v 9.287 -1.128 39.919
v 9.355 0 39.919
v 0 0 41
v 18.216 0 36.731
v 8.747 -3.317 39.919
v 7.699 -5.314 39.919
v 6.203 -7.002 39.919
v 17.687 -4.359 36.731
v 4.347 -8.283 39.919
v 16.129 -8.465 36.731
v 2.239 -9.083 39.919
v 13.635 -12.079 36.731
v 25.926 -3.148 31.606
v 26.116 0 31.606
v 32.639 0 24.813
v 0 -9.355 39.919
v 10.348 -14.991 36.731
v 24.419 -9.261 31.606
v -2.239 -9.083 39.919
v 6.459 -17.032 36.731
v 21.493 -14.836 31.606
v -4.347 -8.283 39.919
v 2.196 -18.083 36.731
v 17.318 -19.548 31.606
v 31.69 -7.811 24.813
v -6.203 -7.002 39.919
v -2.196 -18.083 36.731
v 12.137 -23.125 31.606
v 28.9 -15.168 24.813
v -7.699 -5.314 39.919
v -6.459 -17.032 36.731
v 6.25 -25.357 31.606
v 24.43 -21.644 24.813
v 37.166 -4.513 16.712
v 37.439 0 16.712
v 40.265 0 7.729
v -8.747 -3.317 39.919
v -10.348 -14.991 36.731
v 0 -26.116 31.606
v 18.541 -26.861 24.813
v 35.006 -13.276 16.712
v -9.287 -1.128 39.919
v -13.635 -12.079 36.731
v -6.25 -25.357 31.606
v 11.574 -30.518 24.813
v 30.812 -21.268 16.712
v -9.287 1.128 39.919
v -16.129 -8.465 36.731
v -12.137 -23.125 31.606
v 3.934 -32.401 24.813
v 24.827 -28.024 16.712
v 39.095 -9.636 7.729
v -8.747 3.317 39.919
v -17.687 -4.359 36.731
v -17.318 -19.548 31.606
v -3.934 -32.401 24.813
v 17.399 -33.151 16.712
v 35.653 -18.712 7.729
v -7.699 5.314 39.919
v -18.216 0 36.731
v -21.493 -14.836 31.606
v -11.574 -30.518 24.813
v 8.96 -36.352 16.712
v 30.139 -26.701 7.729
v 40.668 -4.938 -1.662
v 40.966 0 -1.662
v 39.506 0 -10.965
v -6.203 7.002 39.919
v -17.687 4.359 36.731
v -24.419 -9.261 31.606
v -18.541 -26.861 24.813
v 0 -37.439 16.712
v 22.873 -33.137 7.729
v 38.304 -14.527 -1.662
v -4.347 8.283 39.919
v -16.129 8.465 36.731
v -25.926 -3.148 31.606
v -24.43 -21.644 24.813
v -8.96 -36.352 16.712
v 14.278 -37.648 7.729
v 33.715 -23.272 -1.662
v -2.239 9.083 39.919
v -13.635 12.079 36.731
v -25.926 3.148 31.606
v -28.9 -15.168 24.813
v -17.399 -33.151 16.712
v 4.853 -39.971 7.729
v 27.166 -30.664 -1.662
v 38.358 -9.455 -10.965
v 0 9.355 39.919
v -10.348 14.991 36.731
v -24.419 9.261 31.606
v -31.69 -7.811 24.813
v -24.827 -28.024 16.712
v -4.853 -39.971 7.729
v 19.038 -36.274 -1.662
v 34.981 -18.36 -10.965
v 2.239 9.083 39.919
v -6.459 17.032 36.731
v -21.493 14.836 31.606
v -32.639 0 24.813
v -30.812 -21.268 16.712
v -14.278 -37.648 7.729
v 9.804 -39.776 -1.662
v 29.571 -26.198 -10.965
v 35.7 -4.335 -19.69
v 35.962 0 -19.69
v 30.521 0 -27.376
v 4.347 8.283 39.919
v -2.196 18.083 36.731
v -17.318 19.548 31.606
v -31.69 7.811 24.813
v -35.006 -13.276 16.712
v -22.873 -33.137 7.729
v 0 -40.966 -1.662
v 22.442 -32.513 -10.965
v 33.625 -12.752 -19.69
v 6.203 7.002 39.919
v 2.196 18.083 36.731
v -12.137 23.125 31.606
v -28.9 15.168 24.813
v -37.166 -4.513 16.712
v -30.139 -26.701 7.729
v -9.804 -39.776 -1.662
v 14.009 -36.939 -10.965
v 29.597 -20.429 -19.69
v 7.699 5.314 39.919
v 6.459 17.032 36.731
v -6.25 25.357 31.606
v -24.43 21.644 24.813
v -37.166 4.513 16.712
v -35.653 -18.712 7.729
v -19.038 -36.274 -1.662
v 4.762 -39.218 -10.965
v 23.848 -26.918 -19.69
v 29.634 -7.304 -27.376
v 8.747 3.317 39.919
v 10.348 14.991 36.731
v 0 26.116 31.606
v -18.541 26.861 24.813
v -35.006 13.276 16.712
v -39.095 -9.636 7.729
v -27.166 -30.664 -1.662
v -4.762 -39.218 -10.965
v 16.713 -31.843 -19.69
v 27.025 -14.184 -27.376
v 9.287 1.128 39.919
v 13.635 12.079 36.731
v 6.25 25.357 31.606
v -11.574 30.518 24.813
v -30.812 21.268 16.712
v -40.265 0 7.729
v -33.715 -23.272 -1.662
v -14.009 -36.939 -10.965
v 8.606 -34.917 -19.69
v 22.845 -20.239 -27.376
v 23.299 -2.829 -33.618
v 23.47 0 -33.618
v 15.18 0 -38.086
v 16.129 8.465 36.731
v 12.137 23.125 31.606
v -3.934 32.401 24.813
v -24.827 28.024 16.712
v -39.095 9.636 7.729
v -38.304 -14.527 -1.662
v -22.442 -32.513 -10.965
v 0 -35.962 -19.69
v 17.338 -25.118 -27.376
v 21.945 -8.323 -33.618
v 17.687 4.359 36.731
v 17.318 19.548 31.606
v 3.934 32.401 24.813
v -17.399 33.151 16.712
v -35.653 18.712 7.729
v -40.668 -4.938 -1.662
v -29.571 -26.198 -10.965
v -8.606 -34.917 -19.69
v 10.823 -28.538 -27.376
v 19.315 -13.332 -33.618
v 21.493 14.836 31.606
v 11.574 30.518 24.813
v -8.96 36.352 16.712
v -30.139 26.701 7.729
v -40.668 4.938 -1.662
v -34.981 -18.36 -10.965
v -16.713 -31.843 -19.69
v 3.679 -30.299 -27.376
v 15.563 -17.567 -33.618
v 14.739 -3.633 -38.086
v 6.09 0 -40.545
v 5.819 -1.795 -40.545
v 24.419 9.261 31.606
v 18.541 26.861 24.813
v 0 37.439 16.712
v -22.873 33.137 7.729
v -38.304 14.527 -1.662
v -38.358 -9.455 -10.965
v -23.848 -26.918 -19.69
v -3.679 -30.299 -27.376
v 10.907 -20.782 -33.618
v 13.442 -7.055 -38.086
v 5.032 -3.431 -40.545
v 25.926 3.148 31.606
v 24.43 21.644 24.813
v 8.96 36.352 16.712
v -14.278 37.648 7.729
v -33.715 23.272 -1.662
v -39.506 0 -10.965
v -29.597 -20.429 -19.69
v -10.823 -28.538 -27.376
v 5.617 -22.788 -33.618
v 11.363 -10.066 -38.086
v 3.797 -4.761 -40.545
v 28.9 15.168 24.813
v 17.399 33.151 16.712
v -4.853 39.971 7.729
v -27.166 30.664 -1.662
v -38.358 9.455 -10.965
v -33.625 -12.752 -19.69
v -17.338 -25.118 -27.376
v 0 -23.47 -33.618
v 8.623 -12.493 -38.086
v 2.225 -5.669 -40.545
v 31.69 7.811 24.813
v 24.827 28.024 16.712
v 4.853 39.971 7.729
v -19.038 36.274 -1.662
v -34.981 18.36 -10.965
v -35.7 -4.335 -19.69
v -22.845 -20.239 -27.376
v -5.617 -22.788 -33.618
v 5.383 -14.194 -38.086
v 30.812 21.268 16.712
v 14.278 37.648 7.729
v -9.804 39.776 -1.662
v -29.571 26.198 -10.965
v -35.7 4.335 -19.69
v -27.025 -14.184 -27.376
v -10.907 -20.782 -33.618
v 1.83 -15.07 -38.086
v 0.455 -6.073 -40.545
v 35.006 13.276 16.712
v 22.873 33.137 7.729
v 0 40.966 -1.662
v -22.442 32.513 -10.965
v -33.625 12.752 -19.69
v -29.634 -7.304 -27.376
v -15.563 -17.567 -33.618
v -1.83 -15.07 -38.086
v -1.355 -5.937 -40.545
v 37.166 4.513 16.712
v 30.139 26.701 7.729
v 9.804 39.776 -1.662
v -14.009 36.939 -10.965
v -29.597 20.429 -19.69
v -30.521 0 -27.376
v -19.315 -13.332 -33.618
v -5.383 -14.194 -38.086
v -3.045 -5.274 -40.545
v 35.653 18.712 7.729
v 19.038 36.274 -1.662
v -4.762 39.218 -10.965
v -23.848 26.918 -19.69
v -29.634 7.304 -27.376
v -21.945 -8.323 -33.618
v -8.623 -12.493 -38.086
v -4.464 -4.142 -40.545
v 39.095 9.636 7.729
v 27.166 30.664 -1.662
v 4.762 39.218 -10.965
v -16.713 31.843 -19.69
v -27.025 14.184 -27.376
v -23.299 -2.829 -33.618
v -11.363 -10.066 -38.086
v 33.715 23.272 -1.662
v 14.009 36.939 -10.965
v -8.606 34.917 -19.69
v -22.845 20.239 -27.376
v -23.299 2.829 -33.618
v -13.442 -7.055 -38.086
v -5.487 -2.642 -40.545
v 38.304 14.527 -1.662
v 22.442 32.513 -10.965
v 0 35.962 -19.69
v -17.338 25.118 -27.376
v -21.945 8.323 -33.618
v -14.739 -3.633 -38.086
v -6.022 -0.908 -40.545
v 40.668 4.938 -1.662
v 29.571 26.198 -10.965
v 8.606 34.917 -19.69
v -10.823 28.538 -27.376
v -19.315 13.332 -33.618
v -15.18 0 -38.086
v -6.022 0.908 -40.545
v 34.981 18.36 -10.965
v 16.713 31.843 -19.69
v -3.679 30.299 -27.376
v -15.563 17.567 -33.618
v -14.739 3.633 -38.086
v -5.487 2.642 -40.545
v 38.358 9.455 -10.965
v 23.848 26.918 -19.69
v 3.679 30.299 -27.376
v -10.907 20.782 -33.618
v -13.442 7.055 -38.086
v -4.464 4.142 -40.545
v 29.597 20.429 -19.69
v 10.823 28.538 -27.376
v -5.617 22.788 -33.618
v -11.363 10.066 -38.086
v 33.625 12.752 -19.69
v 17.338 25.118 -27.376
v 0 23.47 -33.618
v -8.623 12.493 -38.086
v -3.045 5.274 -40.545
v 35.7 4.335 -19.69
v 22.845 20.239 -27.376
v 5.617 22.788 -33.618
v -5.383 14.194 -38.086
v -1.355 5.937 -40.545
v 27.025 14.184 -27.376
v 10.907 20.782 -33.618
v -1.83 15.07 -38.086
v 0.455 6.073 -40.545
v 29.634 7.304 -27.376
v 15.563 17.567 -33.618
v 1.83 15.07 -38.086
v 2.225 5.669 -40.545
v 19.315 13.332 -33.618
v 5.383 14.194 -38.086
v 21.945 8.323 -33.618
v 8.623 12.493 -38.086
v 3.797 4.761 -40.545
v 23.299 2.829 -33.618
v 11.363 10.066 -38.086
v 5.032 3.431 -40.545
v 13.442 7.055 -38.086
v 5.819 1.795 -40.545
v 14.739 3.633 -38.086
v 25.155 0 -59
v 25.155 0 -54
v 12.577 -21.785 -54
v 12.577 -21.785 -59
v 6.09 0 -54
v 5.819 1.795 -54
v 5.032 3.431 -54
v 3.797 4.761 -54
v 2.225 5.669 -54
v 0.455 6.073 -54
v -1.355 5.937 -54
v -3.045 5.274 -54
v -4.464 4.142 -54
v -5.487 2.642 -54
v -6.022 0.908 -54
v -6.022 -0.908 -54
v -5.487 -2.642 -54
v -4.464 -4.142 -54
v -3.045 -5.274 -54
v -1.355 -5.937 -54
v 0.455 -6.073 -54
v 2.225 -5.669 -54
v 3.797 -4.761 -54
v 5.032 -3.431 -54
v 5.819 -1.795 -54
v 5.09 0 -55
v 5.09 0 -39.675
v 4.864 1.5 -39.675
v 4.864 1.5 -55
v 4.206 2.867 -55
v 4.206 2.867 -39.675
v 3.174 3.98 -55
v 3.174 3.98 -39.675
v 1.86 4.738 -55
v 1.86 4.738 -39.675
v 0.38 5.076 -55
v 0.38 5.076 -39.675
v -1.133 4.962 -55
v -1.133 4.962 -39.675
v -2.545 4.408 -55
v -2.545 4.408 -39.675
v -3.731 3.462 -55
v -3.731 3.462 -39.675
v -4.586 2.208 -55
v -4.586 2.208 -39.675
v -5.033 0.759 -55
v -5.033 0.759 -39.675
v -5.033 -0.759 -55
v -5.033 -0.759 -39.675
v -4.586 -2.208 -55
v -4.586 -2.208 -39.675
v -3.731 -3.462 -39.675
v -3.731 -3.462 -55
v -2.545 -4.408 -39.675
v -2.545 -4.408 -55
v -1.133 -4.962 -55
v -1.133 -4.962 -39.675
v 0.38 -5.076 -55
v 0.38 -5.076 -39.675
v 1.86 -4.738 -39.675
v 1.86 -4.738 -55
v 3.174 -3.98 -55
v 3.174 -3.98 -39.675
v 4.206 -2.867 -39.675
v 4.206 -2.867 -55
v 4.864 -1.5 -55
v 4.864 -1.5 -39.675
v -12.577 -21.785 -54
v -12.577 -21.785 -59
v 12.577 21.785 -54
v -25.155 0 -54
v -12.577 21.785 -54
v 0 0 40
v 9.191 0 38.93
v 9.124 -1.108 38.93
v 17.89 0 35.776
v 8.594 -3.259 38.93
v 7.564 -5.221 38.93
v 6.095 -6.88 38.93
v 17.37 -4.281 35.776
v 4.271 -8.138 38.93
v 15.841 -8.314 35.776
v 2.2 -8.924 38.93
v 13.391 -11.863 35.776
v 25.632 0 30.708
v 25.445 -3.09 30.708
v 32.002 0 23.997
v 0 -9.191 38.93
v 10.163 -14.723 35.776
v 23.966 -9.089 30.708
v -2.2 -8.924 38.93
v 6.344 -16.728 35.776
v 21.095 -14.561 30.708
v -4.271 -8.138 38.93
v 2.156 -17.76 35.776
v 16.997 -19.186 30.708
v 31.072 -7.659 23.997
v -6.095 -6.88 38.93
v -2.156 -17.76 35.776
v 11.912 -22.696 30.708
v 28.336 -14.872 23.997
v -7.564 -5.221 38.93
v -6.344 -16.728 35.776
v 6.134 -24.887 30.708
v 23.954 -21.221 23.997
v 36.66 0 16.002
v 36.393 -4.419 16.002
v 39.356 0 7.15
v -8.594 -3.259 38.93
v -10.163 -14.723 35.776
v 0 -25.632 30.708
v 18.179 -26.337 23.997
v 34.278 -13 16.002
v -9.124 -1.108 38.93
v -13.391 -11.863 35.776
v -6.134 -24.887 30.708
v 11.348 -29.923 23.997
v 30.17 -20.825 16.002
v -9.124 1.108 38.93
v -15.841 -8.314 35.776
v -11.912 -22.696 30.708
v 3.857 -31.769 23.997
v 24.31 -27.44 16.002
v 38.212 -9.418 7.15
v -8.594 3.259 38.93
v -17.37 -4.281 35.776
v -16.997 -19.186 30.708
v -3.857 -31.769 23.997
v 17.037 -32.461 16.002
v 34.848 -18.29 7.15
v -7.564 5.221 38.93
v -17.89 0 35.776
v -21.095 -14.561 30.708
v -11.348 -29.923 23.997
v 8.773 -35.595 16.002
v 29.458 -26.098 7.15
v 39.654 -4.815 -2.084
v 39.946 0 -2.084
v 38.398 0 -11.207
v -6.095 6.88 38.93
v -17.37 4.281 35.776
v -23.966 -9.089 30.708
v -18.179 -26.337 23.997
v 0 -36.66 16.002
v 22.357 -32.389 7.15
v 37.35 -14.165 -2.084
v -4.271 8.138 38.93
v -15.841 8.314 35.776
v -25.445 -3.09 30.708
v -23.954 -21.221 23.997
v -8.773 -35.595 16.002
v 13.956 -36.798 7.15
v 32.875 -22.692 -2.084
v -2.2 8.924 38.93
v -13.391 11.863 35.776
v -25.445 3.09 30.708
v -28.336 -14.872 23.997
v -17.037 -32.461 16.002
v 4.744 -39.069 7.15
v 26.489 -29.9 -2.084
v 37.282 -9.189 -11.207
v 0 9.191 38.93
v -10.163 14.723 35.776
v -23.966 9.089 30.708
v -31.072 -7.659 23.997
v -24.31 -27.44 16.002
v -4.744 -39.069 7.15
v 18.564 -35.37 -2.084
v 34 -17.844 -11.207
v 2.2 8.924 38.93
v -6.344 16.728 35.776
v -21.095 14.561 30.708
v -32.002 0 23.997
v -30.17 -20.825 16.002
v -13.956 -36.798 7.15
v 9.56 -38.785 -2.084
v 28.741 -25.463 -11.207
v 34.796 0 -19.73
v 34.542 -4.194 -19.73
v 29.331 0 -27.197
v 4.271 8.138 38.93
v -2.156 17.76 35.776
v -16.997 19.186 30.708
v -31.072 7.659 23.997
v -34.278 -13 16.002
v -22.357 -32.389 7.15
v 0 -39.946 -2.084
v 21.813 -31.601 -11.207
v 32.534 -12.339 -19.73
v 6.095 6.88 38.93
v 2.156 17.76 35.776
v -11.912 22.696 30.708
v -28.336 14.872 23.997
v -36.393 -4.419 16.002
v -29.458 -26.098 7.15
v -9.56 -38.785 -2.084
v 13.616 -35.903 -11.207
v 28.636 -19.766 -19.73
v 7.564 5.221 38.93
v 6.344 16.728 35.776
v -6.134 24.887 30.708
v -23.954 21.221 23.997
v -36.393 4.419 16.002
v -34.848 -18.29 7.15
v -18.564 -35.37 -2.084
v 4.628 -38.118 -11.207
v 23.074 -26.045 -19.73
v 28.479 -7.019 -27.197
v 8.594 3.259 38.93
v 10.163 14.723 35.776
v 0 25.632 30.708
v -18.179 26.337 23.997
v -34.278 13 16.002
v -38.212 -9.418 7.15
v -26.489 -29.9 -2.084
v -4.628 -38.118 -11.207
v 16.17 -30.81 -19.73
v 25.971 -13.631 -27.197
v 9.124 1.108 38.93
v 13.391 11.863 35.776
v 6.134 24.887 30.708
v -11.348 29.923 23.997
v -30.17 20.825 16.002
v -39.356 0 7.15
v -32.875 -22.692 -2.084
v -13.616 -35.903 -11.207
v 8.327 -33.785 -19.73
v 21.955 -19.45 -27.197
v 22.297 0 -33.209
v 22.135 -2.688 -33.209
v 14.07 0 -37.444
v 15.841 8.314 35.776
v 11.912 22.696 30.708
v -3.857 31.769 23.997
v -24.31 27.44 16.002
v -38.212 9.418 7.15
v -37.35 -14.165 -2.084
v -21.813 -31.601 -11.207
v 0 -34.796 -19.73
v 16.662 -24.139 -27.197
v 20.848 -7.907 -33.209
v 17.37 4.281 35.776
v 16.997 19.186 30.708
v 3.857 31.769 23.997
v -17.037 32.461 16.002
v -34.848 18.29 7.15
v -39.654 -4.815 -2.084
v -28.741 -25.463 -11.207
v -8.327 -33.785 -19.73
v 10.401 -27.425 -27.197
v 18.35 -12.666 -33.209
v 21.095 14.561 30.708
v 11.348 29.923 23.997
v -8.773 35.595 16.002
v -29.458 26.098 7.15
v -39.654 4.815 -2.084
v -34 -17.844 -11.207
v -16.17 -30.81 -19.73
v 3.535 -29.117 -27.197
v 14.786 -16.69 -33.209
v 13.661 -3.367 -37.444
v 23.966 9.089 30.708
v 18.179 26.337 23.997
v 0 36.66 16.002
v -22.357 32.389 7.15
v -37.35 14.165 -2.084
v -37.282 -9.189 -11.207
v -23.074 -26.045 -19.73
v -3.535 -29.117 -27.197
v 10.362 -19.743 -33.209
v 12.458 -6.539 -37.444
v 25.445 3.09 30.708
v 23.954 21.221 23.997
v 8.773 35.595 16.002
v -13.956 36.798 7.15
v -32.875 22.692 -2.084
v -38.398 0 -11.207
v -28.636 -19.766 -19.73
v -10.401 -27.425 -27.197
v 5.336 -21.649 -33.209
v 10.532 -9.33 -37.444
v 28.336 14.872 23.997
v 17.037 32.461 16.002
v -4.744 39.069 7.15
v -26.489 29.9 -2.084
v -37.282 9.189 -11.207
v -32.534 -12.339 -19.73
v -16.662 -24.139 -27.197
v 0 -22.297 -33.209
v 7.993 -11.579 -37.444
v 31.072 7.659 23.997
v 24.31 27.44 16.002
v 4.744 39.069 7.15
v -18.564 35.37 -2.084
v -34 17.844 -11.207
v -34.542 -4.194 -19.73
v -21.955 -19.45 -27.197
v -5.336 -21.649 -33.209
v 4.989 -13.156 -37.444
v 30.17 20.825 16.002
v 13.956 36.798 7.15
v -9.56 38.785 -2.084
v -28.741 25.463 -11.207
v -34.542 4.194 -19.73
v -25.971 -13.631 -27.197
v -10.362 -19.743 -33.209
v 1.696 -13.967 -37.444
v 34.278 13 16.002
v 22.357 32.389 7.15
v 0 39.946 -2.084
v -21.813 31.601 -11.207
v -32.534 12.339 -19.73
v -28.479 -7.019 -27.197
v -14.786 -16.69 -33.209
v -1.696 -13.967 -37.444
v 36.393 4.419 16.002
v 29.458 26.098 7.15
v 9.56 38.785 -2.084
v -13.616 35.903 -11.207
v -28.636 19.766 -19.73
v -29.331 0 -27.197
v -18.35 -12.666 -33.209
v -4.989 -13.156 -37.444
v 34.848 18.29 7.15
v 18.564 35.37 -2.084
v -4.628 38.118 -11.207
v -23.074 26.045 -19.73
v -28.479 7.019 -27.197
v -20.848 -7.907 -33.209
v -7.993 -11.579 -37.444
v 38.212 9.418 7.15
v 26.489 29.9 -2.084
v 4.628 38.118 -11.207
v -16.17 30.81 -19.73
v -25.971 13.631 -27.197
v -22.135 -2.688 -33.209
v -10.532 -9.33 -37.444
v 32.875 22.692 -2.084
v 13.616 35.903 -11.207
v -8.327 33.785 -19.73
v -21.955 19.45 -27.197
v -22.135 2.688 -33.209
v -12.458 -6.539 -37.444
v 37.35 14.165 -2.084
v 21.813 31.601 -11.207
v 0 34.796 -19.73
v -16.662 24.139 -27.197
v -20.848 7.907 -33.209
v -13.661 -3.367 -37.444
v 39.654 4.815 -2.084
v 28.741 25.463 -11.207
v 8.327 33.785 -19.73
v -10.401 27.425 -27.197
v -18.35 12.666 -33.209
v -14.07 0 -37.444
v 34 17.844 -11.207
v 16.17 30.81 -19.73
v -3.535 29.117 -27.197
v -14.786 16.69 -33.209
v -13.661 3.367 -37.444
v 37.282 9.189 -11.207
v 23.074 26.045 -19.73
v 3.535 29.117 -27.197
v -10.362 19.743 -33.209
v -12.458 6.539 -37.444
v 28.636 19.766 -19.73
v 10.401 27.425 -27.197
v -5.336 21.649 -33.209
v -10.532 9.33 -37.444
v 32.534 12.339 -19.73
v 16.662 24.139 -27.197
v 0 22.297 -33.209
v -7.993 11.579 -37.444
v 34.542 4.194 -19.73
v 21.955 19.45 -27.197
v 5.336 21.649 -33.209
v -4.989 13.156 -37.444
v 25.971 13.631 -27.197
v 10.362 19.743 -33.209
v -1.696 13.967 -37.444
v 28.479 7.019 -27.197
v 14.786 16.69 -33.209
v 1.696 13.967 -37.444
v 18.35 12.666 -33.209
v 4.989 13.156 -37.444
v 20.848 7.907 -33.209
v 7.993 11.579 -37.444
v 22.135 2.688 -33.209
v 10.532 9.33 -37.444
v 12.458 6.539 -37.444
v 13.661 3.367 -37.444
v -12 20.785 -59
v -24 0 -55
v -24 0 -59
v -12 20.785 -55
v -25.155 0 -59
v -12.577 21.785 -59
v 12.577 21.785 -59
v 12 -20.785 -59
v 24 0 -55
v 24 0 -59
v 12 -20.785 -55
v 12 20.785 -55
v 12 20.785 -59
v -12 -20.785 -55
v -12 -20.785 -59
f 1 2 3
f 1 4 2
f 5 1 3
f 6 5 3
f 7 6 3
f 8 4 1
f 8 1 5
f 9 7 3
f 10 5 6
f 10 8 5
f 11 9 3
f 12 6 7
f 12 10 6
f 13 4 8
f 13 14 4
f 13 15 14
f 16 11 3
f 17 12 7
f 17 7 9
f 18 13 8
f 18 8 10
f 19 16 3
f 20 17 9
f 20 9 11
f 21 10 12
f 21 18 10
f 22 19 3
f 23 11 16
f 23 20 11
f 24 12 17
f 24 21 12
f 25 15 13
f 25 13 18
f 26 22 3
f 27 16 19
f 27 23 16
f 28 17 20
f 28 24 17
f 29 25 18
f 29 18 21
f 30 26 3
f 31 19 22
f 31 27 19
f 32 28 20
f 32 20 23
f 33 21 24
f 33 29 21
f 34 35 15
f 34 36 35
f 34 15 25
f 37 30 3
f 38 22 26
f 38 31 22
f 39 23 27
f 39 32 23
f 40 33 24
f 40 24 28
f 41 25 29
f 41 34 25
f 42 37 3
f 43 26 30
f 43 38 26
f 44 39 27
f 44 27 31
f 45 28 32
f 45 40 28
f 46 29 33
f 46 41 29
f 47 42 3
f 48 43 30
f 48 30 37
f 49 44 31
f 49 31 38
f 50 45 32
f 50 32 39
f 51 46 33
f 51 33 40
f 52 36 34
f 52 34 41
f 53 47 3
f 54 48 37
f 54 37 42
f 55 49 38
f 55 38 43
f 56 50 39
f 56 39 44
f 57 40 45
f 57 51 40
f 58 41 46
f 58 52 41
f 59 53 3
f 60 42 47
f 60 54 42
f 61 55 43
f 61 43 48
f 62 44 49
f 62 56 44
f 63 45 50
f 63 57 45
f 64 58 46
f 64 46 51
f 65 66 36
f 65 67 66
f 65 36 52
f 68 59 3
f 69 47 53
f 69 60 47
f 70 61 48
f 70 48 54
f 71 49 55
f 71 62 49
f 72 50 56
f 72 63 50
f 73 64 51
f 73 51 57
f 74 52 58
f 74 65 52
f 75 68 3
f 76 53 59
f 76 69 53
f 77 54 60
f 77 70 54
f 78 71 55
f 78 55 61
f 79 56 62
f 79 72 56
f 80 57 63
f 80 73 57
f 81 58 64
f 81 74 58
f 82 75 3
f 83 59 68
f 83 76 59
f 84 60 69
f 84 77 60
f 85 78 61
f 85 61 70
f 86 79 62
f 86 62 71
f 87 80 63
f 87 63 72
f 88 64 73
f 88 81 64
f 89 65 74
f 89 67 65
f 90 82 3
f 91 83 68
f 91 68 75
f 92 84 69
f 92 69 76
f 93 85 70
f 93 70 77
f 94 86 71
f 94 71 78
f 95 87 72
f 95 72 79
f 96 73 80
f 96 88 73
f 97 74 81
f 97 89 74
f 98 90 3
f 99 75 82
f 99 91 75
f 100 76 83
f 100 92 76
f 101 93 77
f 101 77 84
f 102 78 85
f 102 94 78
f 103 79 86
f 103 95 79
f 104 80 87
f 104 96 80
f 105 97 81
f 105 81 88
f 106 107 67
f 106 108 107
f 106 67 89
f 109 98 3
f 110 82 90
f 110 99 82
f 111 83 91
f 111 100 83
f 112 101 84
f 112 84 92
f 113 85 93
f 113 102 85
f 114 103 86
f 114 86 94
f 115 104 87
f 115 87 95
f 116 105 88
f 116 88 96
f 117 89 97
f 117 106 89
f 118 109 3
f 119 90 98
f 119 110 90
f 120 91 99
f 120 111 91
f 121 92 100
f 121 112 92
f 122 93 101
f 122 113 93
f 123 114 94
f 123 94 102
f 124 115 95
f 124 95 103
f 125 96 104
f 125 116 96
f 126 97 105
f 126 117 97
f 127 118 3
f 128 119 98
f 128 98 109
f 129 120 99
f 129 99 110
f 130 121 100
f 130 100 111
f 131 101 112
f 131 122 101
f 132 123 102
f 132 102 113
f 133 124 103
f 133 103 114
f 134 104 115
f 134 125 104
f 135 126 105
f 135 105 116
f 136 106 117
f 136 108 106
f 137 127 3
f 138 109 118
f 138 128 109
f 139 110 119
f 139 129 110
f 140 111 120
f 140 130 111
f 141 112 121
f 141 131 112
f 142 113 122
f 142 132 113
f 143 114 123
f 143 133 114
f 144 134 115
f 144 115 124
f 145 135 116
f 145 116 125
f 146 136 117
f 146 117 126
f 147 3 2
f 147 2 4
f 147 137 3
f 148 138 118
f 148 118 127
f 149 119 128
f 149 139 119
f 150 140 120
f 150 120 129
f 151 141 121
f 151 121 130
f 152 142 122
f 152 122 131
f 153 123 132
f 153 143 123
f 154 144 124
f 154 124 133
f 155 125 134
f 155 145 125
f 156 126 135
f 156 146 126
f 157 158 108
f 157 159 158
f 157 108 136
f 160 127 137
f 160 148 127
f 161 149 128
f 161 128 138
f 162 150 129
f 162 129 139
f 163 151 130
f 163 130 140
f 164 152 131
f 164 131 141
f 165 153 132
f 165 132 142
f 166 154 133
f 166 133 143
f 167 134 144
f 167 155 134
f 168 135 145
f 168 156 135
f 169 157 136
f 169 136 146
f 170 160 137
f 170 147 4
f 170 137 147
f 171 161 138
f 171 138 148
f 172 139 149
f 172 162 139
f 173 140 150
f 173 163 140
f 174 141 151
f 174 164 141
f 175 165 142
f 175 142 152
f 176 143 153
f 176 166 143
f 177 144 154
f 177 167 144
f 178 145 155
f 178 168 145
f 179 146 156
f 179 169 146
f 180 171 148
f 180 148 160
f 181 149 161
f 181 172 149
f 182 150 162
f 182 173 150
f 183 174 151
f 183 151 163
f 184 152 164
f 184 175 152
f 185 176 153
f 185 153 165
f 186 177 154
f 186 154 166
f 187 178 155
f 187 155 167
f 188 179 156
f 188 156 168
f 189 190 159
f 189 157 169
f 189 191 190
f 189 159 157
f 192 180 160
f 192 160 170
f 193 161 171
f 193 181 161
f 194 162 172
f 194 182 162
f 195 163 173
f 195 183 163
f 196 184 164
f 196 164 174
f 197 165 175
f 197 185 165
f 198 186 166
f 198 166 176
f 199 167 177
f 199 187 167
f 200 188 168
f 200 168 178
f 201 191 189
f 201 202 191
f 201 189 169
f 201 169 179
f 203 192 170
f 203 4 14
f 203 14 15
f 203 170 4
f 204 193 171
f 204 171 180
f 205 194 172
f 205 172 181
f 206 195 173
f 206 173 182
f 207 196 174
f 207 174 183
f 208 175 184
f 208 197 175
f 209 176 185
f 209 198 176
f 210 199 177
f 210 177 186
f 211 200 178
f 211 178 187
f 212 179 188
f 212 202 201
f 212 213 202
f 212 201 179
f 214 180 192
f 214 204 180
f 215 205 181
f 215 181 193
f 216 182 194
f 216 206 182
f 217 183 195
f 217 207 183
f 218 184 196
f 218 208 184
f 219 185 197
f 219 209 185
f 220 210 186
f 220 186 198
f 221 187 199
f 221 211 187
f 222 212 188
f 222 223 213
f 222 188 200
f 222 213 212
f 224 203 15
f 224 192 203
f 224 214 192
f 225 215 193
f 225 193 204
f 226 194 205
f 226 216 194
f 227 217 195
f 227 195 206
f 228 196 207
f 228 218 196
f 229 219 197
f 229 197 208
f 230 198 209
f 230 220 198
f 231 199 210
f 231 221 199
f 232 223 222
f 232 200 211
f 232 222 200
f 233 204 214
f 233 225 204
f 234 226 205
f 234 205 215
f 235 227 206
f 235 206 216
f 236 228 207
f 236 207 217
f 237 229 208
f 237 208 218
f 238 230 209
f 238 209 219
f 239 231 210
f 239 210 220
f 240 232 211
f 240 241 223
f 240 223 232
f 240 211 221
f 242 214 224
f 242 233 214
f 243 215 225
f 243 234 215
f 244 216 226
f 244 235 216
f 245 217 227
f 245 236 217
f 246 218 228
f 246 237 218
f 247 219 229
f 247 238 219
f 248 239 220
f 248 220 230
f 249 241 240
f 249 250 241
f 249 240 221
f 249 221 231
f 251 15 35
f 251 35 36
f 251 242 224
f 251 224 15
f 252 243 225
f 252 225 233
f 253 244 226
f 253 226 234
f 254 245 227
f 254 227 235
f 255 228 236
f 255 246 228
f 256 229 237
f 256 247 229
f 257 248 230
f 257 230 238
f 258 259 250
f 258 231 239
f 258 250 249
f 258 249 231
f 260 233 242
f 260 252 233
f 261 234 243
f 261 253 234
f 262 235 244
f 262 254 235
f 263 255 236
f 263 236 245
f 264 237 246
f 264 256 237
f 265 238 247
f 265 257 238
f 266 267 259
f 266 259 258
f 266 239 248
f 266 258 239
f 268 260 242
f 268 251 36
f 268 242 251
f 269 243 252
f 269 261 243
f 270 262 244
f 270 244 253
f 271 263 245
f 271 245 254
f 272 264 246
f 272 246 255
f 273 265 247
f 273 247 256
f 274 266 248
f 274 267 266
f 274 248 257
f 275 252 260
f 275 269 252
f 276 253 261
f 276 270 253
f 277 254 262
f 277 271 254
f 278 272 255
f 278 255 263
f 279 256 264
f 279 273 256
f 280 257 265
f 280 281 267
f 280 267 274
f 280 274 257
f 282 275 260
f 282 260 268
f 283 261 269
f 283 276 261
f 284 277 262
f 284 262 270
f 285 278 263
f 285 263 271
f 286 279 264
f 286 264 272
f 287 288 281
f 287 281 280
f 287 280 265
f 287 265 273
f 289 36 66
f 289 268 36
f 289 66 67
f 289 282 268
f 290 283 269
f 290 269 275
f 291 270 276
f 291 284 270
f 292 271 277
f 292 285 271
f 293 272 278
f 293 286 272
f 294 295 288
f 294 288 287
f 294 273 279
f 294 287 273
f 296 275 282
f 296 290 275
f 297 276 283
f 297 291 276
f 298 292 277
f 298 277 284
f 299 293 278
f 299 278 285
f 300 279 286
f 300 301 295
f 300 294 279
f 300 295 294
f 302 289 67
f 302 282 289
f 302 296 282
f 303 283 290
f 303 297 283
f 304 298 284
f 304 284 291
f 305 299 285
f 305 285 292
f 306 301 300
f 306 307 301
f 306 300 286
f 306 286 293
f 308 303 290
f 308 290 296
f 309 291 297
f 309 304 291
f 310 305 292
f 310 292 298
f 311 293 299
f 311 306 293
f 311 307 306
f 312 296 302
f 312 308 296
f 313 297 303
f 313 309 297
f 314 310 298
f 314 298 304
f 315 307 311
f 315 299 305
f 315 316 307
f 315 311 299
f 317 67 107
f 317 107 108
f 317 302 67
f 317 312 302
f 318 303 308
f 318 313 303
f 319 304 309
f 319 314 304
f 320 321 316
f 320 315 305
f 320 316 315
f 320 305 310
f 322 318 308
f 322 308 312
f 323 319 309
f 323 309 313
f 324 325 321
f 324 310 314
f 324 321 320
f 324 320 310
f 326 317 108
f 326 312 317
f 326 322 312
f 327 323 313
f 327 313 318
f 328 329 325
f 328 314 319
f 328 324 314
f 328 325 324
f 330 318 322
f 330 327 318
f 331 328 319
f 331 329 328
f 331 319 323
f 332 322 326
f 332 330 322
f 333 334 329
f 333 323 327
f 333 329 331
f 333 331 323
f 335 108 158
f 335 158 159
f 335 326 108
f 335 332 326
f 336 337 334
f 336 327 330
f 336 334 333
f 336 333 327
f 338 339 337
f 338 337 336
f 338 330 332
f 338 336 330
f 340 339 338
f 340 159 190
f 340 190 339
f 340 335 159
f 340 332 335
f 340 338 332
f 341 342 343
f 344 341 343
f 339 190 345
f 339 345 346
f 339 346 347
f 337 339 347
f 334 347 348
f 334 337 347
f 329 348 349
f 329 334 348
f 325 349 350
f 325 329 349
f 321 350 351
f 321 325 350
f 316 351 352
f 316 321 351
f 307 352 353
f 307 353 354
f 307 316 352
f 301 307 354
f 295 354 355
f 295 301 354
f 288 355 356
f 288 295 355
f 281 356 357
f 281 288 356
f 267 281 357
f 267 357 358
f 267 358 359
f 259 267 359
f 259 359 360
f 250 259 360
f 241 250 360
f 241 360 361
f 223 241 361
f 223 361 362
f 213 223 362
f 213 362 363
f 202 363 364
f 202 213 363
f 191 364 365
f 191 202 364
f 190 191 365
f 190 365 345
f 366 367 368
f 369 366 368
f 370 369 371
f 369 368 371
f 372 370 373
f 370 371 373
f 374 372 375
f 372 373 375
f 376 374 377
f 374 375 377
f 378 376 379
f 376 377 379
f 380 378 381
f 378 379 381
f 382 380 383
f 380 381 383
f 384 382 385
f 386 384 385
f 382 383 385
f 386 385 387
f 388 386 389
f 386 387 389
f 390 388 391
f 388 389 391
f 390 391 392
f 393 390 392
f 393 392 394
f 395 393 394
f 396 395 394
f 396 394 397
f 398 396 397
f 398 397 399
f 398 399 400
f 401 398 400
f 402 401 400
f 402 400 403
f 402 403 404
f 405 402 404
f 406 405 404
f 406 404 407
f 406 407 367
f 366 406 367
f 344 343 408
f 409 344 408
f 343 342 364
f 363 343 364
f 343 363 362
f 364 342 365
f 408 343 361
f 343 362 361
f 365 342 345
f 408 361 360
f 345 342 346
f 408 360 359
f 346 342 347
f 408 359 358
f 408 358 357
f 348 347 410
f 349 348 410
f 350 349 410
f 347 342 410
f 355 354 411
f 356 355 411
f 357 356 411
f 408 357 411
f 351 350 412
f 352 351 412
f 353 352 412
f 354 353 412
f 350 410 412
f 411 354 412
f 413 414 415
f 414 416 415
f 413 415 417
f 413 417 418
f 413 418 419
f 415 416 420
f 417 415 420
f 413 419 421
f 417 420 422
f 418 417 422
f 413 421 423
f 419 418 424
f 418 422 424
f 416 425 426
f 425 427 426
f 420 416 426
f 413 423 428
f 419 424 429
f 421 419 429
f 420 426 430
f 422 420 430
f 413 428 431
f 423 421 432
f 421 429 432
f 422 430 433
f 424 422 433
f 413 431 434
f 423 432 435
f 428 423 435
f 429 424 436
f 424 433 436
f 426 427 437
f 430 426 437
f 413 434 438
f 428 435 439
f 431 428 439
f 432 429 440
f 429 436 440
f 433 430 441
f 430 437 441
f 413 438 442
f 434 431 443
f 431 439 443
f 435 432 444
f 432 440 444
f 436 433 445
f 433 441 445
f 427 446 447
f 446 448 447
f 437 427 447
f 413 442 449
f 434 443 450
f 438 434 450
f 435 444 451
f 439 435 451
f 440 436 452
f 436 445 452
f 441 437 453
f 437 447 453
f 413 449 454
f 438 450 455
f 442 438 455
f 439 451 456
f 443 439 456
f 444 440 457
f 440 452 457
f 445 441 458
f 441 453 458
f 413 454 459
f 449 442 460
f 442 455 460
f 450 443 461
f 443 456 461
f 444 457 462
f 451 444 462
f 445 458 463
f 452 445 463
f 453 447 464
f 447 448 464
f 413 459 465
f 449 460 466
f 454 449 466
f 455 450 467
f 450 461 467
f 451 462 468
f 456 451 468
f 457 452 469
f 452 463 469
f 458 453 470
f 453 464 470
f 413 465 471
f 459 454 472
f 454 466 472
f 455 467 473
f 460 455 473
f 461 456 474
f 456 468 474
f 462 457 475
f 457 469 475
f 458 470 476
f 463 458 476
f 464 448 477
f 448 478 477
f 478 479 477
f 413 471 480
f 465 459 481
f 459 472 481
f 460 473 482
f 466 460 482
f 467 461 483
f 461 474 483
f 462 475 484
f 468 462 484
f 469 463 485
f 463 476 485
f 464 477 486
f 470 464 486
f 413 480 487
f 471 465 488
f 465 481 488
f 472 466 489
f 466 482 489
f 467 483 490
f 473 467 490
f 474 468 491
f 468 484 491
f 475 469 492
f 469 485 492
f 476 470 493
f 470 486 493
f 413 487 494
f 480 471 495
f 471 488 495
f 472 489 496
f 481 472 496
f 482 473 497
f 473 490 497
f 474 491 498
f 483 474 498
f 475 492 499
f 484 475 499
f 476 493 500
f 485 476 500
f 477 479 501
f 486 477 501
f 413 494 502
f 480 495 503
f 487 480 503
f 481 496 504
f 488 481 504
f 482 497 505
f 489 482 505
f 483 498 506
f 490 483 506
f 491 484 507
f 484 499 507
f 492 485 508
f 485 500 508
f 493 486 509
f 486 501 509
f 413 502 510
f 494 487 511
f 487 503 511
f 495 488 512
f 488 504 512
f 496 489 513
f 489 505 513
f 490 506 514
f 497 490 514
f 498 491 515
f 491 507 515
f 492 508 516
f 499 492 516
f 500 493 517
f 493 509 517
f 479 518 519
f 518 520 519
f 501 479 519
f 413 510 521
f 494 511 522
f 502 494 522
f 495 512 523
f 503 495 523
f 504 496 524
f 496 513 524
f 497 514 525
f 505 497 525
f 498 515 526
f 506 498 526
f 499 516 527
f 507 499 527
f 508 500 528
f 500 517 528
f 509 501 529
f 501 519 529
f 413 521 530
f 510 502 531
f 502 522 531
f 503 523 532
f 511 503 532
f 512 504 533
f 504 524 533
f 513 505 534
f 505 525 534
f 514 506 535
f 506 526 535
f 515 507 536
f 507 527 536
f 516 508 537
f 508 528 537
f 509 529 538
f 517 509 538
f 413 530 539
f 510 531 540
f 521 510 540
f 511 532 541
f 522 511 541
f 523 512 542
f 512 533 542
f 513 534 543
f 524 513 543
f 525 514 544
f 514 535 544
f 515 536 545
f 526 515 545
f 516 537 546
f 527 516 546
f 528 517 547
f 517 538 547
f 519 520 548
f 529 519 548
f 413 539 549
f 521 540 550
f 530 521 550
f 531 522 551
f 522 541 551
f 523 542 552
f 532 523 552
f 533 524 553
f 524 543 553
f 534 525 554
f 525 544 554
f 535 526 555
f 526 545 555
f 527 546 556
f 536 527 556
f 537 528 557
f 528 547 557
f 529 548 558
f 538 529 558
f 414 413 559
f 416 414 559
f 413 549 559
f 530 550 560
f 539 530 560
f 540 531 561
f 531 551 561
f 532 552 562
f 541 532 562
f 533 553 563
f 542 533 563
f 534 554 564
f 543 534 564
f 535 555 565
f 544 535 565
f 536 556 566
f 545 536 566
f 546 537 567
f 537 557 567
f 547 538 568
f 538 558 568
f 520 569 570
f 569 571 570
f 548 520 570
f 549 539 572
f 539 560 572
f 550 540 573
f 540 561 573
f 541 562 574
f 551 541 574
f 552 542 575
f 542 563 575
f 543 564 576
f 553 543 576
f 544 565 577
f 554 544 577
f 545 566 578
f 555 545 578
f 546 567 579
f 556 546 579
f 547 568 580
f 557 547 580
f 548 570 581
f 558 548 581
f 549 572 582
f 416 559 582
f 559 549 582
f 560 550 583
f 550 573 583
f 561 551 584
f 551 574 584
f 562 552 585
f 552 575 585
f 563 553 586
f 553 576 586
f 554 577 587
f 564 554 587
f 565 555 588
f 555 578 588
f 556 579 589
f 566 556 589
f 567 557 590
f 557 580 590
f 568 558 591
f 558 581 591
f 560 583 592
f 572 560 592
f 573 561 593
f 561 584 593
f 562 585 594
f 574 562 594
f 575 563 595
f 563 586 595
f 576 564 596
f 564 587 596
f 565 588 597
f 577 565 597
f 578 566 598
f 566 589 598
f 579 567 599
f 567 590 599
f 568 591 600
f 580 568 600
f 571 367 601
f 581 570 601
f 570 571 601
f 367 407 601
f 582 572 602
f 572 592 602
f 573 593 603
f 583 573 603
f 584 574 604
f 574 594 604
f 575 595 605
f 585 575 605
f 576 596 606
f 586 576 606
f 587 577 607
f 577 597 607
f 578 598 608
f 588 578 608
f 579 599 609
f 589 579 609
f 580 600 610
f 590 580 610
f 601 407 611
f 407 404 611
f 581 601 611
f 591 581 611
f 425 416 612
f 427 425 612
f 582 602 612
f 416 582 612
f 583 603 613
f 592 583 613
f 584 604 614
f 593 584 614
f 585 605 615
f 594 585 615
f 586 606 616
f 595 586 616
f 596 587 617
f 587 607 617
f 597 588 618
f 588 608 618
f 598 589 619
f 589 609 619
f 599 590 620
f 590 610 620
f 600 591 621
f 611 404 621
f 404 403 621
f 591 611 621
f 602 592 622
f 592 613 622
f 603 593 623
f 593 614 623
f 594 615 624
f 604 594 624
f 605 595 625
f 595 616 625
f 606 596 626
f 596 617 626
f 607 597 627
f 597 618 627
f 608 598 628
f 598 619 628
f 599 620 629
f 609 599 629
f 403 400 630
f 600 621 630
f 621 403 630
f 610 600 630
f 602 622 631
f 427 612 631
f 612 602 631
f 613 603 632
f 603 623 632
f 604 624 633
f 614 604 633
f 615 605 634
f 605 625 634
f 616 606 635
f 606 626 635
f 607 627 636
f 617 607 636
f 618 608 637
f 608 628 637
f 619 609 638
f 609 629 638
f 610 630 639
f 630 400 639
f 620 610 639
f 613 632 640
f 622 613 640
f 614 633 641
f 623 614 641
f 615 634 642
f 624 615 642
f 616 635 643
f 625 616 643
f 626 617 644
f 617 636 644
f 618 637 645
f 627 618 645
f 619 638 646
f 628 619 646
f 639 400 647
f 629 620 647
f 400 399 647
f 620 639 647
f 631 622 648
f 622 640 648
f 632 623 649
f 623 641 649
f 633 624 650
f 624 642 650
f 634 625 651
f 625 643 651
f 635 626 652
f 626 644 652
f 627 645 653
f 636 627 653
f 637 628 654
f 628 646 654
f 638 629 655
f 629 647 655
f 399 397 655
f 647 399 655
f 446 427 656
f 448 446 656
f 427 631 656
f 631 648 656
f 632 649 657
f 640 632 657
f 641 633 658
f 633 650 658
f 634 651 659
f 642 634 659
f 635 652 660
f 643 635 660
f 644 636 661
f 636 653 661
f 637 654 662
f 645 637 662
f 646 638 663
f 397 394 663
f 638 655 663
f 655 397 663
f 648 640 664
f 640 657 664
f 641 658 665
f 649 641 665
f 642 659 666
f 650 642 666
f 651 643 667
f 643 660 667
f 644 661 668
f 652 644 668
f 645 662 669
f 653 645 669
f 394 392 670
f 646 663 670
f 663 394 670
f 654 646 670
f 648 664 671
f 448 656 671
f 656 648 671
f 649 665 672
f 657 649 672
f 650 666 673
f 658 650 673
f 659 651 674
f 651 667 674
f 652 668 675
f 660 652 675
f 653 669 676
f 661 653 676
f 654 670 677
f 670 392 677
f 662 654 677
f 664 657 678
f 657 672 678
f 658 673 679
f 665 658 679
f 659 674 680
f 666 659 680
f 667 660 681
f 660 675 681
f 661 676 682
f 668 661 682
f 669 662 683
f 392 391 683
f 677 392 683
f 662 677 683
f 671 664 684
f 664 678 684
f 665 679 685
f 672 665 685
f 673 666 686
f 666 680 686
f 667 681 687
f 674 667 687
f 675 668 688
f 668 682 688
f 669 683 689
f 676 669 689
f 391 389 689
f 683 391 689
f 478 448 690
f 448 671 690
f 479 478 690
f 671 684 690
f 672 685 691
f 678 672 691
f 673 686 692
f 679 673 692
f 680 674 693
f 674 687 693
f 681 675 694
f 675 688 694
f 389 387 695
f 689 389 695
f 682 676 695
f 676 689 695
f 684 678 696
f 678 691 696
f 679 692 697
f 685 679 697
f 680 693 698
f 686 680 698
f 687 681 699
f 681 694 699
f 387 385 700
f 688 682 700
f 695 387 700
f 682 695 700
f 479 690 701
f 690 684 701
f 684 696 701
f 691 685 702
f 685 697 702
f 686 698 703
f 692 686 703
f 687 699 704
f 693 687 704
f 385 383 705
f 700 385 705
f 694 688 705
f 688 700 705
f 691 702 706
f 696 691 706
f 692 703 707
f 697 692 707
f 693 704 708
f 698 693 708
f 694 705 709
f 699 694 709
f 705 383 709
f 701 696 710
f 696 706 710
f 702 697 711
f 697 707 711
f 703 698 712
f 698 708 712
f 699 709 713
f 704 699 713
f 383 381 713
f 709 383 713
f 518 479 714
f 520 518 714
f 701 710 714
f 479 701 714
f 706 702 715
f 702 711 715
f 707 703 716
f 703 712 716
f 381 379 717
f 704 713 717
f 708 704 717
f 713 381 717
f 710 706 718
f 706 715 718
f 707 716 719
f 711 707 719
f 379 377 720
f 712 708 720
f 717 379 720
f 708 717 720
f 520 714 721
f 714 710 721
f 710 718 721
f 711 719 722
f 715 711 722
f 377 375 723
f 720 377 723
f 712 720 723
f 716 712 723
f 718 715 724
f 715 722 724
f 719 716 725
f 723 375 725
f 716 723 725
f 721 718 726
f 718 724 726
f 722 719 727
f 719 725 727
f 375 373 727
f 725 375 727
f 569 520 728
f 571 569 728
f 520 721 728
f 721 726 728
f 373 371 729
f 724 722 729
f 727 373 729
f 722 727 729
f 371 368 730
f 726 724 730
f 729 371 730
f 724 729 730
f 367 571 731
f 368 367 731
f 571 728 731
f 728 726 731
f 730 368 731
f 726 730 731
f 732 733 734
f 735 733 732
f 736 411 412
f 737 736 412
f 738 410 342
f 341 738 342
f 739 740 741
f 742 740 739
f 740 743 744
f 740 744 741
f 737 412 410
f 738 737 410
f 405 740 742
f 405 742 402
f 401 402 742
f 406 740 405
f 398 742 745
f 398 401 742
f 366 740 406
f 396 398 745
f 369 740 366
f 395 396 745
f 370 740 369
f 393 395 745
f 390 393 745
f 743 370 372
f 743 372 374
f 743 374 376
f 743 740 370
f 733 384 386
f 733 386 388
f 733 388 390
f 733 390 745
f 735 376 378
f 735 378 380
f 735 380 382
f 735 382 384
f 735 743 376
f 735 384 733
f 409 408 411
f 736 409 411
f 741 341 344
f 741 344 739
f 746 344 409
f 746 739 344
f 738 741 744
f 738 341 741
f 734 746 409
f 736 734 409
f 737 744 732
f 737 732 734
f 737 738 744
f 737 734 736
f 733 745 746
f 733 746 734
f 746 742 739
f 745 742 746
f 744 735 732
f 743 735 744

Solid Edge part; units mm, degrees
sketch "Sketch1" plane through (0, 0, 0) normal (0, -1, 0) x (1, 0, 0)
  line L0 (0, 40) -> (0, -40)
  arc A0 (0, 40) -> (0, -40) centre (0, 0) cw
revolve "RevolvedProtrusion1" add sketch "Sketch1" angle 360 about axis through (0, 0, 45) along (0, 0, -1)
sketch "Sketch2" plane through (0, 0, 0) normal (0, 0, 1) x (1, 0, 0)
  circle A0 centre (0, 0) radius 5.09
extrude "Protrusion1" add sketch "Sketch2" against normal blind 55
sketch "Sketch3" plane through (0, 0, -55) normal (0, 0, -1) x (1, 0, 0)
  line L0 (-24, 0) -> (-12, -20.7846)
  line L1 (-12, -20.7846) -> (12, -20.7846)
  line L2 (12, -20.7846) -> (24, 0)
  line L3 (24, 0) -> (12, 20.7846)
  line L4 (12, 20.7846) -> (-12, 20.7846)
  line L5 (-12, 20.7846) -> (-24, 0)
extrude "ExtrudedProtrusion_3" add sketch "Sketch3" along normal blind 4
shell "Thinwall_1" thickness 0 removed faces 1 at (16.48, 0.4157, -59) outside thickness 1
